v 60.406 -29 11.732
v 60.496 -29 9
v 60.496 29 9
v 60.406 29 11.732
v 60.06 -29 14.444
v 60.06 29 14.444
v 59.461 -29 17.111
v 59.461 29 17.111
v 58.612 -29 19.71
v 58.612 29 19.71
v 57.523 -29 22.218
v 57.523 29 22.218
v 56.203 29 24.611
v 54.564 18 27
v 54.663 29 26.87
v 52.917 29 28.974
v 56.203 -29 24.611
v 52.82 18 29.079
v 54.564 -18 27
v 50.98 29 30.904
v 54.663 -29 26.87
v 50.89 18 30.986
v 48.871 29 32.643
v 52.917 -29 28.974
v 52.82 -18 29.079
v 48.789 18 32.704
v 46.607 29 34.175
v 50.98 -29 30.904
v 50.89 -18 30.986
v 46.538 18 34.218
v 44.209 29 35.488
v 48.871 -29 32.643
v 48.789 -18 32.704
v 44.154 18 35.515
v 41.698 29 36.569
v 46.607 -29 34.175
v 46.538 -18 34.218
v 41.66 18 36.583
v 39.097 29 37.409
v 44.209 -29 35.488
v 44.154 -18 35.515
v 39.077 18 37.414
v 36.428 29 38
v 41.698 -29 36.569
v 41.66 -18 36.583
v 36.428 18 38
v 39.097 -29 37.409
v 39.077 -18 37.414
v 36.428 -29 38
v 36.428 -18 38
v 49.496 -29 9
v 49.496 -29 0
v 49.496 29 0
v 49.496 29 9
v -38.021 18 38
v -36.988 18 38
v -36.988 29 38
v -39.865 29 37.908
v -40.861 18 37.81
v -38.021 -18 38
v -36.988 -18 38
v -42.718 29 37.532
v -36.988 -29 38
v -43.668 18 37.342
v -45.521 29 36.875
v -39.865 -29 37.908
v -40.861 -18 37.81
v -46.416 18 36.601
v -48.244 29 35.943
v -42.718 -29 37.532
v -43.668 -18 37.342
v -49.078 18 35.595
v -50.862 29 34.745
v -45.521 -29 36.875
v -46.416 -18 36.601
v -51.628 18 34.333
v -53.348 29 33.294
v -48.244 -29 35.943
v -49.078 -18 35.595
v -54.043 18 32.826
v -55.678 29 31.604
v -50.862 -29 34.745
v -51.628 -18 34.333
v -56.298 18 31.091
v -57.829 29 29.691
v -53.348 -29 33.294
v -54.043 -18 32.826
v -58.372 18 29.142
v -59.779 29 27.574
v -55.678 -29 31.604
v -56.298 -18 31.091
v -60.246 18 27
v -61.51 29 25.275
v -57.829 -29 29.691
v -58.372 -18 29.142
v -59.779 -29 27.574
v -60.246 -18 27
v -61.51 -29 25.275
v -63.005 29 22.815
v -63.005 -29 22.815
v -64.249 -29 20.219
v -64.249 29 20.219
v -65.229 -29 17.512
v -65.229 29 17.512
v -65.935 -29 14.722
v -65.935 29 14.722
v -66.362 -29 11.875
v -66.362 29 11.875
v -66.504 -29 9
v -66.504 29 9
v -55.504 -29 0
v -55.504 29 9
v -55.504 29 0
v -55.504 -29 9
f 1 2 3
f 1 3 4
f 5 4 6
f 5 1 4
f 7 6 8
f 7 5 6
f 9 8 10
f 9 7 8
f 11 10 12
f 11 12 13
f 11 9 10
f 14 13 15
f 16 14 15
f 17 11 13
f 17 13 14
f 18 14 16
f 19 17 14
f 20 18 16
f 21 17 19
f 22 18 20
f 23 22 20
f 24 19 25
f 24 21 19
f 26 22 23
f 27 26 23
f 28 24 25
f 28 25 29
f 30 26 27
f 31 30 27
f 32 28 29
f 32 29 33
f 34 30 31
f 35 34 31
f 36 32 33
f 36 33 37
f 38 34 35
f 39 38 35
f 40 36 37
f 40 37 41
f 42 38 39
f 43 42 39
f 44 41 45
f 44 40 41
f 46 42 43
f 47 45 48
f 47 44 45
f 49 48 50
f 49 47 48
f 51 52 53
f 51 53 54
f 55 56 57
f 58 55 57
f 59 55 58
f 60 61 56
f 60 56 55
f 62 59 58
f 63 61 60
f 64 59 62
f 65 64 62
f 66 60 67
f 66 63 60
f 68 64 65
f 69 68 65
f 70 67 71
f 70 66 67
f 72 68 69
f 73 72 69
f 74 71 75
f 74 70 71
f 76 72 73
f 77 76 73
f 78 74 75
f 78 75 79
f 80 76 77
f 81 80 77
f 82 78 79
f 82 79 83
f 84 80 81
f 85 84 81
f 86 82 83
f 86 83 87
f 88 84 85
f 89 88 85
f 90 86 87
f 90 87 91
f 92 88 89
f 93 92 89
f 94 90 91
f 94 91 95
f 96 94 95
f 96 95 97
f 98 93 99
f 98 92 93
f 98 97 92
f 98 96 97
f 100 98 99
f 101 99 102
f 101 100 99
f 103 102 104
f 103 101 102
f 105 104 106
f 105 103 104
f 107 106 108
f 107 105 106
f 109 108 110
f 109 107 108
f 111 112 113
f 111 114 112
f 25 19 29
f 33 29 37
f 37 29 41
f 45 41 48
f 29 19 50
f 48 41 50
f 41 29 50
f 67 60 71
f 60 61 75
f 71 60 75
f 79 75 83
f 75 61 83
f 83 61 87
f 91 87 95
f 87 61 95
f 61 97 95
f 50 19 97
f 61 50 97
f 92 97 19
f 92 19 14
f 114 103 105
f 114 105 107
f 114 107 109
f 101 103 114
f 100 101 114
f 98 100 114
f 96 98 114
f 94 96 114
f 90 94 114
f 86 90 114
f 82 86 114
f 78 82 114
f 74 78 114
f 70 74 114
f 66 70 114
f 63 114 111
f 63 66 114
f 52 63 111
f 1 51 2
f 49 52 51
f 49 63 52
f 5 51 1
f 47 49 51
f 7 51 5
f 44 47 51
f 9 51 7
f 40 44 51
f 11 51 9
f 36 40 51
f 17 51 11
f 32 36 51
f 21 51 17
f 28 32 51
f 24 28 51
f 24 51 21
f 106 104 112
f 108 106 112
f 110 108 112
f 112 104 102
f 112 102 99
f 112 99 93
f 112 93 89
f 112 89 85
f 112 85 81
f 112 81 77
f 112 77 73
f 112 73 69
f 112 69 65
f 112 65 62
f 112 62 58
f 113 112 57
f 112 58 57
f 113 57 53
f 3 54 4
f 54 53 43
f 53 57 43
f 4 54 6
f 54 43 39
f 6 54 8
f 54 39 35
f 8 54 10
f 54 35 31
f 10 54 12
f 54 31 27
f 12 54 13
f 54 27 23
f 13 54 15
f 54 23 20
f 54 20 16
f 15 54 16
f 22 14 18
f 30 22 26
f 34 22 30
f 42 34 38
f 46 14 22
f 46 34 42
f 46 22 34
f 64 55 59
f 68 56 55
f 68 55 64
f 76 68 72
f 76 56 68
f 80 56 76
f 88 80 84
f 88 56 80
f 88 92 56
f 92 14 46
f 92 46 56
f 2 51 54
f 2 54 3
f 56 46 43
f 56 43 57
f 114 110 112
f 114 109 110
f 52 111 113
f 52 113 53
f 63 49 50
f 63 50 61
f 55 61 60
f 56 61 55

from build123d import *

# Parameters (mm, degrees)
F1_DEPTH      = 29
F2_W          = 36
F2_H          = 11
F3_DEPTH      = 66.5054850399
F3_DEPTH_BACK = 60.4995857167


with BuildPart() as f1:
    # F0 (on Front) → F1 (new body, symmetric)
    with BuildSketch(Plane.XZ):
        with BuildLine():
            Line((-55.504484674, 9), (-55.504484674, 0))
            Line((-55.504484674, 0), (49.495515326, 0))
            Line((49.495515326, 0), (49.495515326, 9))
            Line((49.495515326, 9), (60.495515326, 9))
            ThreePointArc((60.495515326, 9), (53.8144067162, 27.9423579991), (36.4278033617, 38))
            Line((36.4278033617, 38), (-36.987580359, 38))
            ThreePointArc((-36.987580359, 38), (-57.8286498328, 29.6910356314), (-66.504484674, 9))
            Line((-66.504484674, 9), (-55.504484674, 9))
        make_face()
    extrude(amount=F1_DEPTH, both=True)

    # F2 (on Right) → F3 (cut, two sides)
    with BuildSketch(Plane.YZ) as f3_sk:
        with Locations((0, 32.5)):
            Rectangle(F2_W, F2_H)
    extrude(amount=-F3_DEPTH, mode=Mode.SUBTRACT)
    extrude(f3_sk.sketch, amount=F3_DEPTH_BACK, mode=Mode.SUBTRACT)


solid = f1.part
